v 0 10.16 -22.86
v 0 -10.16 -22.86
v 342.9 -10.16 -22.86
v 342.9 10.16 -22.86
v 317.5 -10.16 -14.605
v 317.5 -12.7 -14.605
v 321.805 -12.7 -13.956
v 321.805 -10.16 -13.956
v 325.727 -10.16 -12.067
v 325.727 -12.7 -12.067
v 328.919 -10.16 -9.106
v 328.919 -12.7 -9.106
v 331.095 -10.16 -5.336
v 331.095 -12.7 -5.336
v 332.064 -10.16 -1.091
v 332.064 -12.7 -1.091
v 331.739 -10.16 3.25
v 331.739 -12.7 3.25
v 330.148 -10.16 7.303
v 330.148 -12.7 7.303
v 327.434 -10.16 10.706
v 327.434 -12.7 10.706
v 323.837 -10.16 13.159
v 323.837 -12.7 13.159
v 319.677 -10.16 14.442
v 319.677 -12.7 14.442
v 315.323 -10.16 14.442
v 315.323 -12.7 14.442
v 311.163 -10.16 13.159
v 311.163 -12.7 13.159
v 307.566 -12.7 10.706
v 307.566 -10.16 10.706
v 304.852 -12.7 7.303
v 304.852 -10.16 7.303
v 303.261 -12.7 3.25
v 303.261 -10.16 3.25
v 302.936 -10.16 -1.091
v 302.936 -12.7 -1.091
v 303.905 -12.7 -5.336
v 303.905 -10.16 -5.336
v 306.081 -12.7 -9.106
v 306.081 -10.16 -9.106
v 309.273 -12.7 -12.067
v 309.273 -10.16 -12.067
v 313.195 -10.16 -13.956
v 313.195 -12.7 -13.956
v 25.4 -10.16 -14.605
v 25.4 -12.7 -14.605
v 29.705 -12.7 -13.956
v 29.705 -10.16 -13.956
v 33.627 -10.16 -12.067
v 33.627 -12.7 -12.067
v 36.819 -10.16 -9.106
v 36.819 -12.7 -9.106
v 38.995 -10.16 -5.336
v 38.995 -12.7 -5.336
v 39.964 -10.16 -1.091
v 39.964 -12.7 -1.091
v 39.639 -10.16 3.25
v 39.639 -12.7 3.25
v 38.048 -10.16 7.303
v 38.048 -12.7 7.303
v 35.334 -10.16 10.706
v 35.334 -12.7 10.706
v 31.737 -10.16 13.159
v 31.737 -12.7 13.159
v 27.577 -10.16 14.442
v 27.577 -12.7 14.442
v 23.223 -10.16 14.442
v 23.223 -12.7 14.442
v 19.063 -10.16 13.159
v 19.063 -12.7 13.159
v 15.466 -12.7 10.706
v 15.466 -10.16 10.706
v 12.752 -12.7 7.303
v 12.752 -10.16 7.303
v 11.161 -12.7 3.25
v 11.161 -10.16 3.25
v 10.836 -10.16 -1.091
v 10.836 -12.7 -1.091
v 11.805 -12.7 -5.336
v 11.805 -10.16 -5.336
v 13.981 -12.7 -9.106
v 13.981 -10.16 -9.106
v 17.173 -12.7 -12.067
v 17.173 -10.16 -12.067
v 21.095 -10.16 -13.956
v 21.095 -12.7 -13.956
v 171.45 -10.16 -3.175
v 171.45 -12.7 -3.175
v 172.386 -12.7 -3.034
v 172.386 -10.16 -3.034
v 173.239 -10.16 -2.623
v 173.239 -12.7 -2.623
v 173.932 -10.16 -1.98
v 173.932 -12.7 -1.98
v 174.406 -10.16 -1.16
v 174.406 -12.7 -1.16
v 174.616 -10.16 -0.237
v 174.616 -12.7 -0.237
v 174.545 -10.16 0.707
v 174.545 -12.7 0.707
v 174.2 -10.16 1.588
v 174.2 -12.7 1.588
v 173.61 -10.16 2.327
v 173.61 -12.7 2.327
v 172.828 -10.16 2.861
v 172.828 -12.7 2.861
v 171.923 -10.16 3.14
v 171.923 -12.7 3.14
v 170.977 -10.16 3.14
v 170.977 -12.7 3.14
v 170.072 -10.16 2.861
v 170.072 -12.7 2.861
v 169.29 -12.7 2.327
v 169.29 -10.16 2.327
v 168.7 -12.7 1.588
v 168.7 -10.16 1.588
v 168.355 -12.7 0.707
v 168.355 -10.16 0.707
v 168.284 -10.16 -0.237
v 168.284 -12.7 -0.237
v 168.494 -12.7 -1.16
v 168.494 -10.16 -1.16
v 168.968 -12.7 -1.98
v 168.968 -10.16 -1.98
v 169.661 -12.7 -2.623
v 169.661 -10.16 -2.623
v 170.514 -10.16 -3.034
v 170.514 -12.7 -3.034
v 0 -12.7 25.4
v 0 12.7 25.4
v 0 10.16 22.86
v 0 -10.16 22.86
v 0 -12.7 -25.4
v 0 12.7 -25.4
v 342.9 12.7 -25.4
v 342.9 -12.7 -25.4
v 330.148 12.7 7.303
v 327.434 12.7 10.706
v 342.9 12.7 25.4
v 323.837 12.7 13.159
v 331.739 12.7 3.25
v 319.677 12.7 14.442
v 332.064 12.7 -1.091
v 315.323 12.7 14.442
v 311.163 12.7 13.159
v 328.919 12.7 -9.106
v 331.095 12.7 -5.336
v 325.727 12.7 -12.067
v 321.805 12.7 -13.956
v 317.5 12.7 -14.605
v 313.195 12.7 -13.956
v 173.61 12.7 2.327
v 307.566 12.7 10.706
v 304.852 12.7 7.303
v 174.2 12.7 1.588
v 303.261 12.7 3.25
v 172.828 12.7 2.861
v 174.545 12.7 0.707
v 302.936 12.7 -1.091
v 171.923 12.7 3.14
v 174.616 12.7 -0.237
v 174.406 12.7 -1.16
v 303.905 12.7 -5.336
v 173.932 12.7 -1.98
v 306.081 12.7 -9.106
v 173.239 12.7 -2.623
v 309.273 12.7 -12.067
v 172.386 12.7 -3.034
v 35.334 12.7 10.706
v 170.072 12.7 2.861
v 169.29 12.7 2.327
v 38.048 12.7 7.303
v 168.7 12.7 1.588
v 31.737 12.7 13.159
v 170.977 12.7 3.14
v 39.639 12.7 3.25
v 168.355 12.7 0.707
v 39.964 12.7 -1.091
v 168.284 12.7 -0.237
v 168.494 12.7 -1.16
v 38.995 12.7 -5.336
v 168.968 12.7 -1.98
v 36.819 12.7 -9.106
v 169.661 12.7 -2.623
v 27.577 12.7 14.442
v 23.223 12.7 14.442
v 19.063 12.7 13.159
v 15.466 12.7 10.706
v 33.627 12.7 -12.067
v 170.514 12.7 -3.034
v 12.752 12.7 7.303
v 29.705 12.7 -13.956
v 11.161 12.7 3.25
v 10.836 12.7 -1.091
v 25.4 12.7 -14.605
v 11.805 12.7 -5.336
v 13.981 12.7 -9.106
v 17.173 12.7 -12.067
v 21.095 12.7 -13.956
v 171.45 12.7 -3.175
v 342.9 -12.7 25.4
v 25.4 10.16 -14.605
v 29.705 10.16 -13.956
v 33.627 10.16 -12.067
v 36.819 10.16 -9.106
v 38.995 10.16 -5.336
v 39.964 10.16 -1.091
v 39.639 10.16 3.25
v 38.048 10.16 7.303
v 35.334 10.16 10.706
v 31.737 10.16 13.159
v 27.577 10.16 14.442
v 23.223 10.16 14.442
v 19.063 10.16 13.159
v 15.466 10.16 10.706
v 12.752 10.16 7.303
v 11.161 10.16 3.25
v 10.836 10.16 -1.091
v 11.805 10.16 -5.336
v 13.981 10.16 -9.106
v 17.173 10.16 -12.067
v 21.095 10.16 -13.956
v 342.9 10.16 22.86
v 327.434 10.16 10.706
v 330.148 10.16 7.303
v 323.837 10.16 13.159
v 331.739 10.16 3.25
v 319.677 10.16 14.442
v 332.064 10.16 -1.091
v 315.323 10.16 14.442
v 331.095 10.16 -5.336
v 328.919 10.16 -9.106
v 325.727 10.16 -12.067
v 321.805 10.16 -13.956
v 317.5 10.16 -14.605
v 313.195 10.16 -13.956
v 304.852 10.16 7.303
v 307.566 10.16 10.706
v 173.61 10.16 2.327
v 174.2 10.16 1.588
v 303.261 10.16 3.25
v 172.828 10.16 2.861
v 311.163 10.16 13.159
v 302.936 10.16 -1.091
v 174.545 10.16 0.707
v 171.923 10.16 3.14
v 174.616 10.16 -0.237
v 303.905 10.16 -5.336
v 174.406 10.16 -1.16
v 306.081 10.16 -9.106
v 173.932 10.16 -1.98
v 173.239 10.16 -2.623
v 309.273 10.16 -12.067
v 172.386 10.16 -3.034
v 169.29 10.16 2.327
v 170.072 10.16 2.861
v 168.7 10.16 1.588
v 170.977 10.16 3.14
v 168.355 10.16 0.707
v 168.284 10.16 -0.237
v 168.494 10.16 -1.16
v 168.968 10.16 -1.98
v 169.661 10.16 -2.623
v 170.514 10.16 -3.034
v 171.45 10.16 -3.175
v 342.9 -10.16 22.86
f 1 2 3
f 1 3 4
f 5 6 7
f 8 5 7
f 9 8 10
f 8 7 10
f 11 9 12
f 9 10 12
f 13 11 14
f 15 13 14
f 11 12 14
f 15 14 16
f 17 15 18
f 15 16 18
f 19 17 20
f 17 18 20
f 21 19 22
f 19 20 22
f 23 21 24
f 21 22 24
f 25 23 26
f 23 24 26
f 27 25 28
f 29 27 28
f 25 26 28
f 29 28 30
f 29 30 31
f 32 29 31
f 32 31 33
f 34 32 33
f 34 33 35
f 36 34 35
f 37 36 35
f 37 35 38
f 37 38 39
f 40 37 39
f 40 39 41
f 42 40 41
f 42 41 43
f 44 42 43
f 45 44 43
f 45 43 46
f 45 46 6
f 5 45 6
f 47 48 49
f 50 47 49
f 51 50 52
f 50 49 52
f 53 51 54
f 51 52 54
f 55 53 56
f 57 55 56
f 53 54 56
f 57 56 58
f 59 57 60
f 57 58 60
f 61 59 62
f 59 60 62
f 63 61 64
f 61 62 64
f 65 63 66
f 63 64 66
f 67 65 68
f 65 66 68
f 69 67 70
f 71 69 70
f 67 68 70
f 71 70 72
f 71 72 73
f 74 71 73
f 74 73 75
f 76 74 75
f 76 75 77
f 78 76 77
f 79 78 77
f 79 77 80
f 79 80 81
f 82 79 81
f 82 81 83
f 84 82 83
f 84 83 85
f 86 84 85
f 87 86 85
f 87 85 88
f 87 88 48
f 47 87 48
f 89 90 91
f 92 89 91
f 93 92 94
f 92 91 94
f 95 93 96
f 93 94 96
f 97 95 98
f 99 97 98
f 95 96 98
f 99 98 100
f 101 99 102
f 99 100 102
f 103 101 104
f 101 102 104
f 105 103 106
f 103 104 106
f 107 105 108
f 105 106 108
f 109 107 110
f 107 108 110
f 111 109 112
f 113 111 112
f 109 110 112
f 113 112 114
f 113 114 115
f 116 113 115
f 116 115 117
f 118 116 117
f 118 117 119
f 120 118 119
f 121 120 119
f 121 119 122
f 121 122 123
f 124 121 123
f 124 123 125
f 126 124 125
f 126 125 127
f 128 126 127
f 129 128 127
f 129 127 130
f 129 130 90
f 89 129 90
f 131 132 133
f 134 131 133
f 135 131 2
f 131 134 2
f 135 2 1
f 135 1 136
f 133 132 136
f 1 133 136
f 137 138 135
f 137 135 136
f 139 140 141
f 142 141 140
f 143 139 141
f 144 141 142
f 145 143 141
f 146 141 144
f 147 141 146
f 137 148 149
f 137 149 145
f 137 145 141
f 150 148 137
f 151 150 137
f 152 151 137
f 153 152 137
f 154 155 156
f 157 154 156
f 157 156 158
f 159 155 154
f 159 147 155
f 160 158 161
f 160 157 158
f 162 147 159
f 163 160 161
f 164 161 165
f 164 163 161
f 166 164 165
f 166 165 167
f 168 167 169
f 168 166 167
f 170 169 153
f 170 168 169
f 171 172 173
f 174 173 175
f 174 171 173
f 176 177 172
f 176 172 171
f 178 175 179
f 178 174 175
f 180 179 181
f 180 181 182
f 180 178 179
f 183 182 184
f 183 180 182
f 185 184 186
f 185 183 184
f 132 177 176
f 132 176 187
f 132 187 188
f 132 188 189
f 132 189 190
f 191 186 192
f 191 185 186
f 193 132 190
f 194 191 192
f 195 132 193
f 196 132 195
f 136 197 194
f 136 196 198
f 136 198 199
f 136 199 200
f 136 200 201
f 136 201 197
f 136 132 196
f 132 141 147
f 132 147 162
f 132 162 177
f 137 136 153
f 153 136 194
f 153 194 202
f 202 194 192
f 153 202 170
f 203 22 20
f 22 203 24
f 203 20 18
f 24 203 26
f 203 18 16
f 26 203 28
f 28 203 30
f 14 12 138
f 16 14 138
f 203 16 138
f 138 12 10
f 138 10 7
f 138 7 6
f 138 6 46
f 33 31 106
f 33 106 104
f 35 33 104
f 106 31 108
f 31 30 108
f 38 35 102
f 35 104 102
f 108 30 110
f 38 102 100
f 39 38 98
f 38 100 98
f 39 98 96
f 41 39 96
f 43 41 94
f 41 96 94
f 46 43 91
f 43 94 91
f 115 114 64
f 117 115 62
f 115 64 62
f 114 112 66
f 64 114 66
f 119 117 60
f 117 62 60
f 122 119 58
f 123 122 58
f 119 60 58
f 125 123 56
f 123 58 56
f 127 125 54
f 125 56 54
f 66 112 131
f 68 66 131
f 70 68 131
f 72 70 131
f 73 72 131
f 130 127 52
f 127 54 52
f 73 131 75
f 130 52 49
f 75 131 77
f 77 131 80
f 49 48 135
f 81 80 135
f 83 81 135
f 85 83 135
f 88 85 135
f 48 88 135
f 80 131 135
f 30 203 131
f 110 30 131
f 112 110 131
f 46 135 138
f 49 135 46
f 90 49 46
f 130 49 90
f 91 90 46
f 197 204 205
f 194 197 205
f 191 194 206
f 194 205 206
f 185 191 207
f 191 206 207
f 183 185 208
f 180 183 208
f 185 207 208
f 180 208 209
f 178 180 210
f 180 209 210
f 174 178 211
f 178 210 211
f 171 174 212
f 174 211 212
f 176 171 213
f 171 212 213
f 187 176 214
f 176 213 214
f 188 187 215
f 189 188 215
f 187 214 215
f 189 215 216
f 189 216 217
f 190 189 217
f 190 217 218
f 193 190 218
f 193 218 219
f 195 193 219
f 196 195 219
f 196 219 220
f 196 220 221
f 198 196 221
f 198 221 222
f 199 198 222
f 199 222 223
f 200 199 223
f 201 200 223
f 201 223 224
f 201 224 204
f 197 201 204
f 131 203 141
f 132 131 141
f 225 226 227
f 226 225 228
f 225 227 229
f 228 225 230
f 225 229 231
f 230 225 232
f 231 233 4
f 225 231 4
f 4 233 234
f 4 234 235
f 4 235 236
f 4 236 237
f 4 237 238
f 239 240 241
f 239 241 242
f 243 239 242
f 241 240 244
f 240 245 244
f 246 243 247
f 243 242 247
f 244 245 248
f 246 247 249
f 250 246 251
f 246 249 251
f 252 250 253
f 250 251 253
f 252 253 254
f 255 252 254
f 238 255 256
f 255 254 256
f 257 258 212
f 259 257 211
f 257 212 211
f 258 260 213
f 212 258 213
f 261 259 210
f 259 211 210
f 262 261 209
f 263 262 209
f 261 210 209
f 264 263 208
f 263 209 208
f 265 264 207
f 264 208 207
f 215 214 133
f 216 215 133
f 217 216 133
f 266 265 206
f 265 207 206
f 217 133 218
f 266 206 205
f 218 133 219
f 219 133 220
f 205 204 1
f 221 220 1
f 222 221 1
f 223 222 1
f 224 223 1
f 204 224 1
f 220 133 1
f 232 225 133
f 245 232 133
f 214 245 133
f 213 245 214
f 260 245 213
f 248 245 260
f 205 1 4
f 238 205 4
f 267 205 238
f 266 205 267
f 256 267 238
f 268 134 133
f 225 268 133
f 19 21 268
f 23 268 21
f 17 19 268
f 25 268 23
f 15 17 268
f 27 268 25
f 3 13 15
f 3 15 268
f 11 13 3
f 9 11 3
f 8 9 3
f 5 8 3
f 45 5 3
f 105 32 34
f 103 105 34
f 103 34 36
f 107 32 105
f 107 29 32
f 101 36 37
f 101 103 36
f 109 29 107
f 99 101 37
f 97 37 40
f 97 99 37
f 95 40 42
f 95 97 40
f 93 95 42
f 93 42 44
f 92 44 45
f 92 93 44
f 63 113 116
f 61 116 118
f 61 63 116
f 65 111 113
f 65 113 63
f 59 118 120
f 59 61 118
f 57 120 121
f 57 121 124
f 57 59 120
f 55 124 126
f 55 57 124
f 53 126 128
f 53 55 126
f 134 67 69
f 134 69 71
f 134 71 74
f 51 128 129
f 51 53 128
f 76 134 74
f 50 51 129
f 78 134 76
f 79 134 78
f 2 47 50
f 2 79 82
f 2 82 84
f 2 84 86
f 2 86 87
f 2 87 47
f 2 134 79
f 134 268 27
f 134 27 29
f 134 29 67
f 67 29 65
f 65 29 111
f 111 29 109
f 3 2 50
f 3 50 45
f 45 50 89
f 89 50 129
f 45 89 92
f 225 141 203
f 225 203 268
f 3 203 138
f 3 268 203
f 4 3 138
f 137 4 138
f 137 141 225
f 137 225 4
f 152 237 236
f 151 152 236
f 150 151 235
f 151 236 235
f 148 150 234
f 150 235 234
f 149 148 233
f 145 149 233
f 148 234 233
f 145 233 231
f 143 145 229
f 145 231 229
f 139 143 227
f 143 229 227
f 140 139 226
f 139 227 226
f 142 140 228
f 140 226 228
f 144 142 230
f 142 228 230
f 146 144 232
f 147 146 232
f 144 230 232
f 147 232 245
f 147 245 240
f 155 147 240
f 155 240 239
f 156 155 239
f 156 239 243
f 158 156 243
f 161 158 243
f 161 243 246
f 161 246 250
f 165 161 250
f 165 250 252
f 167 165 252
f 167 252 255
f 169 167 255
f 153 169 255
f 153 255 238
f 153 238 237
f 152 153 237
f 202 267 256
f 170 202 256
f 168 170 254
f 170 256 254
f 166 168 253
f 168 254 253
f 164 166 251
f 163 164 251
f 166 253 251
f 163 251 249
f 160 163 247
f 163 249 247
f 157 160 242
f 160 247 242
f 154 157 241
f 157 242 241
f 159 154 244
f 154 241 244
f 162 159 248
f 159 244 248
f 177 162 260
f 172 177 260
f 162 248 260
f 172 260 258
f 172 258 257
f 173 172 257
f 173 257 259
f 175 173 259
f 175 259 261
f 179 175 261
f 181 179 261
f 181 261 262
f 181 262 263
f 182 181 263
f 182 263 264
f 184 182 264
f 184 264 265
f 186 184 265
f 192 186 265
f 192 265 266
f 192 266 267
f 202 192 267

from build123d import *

# Parameters (mm, degrees)
SKETCH1_W           = 50.8
SKETCH1_H           = 25.4
SKETCH1_W_2         = 45.72
SKETCH1_H_2         = 20.32
BOSS_EXTRUDE1_DEPTH = 342.9
SKETCH2_R           = 14.605
CUT_EXTRUDE1_DEPTH  = 345.776347797
SKETCH6_R           = 3.175
CUT_EXTRUDE5_DEPTH  = 345.776347797


with BuildPart() as part:
    # Sketch1 → Boss-Extrude1 (new body)
    with BuildSketch(Plane(origin=(0, 0, 0), x_dir=(0, 0, -1), z_dir=(1, 0, 0))):
        Rectangle(SKETCH1_W, SKETCH1_H)
        Rectangle(SKETCH1_W_2, SKETCH1_H_2, mode=Mode.SUBTRACT)
    extrude(amount=BOSS_EXTRUDE1_DEPTH)

    # Sketch2 → Cut-Extrude1 (cut, through all)
    with BuildSketch(Plane.XZ.offset(12.7)):
        with Locations(Location((25.4, 0, 0), (0, 0, 270))):
            Circle(SKETCH2_R)
        with Locations(Location((317.5, 0, 0), (0, 0, 270))):
            Circle(SKETCH2_R)
    extrude(amount=-CUT_EXTRUDE1_DEPTH, mode=Mode.SUBTRACT)

    # Sketch6 → Cut-Extrude5 (cut, through all)
    with BuildSketch(Plane.XZ.offset(12.7)):
        with Locations(Location((171.45, 0, 0), (0, 0, 270))):
            Circle(SKETCH6_R)
    extrude(amount=-CUT_EXTRUDE5_DEPTH, mode=Mode.SUBTRACT)


solid = part.part
